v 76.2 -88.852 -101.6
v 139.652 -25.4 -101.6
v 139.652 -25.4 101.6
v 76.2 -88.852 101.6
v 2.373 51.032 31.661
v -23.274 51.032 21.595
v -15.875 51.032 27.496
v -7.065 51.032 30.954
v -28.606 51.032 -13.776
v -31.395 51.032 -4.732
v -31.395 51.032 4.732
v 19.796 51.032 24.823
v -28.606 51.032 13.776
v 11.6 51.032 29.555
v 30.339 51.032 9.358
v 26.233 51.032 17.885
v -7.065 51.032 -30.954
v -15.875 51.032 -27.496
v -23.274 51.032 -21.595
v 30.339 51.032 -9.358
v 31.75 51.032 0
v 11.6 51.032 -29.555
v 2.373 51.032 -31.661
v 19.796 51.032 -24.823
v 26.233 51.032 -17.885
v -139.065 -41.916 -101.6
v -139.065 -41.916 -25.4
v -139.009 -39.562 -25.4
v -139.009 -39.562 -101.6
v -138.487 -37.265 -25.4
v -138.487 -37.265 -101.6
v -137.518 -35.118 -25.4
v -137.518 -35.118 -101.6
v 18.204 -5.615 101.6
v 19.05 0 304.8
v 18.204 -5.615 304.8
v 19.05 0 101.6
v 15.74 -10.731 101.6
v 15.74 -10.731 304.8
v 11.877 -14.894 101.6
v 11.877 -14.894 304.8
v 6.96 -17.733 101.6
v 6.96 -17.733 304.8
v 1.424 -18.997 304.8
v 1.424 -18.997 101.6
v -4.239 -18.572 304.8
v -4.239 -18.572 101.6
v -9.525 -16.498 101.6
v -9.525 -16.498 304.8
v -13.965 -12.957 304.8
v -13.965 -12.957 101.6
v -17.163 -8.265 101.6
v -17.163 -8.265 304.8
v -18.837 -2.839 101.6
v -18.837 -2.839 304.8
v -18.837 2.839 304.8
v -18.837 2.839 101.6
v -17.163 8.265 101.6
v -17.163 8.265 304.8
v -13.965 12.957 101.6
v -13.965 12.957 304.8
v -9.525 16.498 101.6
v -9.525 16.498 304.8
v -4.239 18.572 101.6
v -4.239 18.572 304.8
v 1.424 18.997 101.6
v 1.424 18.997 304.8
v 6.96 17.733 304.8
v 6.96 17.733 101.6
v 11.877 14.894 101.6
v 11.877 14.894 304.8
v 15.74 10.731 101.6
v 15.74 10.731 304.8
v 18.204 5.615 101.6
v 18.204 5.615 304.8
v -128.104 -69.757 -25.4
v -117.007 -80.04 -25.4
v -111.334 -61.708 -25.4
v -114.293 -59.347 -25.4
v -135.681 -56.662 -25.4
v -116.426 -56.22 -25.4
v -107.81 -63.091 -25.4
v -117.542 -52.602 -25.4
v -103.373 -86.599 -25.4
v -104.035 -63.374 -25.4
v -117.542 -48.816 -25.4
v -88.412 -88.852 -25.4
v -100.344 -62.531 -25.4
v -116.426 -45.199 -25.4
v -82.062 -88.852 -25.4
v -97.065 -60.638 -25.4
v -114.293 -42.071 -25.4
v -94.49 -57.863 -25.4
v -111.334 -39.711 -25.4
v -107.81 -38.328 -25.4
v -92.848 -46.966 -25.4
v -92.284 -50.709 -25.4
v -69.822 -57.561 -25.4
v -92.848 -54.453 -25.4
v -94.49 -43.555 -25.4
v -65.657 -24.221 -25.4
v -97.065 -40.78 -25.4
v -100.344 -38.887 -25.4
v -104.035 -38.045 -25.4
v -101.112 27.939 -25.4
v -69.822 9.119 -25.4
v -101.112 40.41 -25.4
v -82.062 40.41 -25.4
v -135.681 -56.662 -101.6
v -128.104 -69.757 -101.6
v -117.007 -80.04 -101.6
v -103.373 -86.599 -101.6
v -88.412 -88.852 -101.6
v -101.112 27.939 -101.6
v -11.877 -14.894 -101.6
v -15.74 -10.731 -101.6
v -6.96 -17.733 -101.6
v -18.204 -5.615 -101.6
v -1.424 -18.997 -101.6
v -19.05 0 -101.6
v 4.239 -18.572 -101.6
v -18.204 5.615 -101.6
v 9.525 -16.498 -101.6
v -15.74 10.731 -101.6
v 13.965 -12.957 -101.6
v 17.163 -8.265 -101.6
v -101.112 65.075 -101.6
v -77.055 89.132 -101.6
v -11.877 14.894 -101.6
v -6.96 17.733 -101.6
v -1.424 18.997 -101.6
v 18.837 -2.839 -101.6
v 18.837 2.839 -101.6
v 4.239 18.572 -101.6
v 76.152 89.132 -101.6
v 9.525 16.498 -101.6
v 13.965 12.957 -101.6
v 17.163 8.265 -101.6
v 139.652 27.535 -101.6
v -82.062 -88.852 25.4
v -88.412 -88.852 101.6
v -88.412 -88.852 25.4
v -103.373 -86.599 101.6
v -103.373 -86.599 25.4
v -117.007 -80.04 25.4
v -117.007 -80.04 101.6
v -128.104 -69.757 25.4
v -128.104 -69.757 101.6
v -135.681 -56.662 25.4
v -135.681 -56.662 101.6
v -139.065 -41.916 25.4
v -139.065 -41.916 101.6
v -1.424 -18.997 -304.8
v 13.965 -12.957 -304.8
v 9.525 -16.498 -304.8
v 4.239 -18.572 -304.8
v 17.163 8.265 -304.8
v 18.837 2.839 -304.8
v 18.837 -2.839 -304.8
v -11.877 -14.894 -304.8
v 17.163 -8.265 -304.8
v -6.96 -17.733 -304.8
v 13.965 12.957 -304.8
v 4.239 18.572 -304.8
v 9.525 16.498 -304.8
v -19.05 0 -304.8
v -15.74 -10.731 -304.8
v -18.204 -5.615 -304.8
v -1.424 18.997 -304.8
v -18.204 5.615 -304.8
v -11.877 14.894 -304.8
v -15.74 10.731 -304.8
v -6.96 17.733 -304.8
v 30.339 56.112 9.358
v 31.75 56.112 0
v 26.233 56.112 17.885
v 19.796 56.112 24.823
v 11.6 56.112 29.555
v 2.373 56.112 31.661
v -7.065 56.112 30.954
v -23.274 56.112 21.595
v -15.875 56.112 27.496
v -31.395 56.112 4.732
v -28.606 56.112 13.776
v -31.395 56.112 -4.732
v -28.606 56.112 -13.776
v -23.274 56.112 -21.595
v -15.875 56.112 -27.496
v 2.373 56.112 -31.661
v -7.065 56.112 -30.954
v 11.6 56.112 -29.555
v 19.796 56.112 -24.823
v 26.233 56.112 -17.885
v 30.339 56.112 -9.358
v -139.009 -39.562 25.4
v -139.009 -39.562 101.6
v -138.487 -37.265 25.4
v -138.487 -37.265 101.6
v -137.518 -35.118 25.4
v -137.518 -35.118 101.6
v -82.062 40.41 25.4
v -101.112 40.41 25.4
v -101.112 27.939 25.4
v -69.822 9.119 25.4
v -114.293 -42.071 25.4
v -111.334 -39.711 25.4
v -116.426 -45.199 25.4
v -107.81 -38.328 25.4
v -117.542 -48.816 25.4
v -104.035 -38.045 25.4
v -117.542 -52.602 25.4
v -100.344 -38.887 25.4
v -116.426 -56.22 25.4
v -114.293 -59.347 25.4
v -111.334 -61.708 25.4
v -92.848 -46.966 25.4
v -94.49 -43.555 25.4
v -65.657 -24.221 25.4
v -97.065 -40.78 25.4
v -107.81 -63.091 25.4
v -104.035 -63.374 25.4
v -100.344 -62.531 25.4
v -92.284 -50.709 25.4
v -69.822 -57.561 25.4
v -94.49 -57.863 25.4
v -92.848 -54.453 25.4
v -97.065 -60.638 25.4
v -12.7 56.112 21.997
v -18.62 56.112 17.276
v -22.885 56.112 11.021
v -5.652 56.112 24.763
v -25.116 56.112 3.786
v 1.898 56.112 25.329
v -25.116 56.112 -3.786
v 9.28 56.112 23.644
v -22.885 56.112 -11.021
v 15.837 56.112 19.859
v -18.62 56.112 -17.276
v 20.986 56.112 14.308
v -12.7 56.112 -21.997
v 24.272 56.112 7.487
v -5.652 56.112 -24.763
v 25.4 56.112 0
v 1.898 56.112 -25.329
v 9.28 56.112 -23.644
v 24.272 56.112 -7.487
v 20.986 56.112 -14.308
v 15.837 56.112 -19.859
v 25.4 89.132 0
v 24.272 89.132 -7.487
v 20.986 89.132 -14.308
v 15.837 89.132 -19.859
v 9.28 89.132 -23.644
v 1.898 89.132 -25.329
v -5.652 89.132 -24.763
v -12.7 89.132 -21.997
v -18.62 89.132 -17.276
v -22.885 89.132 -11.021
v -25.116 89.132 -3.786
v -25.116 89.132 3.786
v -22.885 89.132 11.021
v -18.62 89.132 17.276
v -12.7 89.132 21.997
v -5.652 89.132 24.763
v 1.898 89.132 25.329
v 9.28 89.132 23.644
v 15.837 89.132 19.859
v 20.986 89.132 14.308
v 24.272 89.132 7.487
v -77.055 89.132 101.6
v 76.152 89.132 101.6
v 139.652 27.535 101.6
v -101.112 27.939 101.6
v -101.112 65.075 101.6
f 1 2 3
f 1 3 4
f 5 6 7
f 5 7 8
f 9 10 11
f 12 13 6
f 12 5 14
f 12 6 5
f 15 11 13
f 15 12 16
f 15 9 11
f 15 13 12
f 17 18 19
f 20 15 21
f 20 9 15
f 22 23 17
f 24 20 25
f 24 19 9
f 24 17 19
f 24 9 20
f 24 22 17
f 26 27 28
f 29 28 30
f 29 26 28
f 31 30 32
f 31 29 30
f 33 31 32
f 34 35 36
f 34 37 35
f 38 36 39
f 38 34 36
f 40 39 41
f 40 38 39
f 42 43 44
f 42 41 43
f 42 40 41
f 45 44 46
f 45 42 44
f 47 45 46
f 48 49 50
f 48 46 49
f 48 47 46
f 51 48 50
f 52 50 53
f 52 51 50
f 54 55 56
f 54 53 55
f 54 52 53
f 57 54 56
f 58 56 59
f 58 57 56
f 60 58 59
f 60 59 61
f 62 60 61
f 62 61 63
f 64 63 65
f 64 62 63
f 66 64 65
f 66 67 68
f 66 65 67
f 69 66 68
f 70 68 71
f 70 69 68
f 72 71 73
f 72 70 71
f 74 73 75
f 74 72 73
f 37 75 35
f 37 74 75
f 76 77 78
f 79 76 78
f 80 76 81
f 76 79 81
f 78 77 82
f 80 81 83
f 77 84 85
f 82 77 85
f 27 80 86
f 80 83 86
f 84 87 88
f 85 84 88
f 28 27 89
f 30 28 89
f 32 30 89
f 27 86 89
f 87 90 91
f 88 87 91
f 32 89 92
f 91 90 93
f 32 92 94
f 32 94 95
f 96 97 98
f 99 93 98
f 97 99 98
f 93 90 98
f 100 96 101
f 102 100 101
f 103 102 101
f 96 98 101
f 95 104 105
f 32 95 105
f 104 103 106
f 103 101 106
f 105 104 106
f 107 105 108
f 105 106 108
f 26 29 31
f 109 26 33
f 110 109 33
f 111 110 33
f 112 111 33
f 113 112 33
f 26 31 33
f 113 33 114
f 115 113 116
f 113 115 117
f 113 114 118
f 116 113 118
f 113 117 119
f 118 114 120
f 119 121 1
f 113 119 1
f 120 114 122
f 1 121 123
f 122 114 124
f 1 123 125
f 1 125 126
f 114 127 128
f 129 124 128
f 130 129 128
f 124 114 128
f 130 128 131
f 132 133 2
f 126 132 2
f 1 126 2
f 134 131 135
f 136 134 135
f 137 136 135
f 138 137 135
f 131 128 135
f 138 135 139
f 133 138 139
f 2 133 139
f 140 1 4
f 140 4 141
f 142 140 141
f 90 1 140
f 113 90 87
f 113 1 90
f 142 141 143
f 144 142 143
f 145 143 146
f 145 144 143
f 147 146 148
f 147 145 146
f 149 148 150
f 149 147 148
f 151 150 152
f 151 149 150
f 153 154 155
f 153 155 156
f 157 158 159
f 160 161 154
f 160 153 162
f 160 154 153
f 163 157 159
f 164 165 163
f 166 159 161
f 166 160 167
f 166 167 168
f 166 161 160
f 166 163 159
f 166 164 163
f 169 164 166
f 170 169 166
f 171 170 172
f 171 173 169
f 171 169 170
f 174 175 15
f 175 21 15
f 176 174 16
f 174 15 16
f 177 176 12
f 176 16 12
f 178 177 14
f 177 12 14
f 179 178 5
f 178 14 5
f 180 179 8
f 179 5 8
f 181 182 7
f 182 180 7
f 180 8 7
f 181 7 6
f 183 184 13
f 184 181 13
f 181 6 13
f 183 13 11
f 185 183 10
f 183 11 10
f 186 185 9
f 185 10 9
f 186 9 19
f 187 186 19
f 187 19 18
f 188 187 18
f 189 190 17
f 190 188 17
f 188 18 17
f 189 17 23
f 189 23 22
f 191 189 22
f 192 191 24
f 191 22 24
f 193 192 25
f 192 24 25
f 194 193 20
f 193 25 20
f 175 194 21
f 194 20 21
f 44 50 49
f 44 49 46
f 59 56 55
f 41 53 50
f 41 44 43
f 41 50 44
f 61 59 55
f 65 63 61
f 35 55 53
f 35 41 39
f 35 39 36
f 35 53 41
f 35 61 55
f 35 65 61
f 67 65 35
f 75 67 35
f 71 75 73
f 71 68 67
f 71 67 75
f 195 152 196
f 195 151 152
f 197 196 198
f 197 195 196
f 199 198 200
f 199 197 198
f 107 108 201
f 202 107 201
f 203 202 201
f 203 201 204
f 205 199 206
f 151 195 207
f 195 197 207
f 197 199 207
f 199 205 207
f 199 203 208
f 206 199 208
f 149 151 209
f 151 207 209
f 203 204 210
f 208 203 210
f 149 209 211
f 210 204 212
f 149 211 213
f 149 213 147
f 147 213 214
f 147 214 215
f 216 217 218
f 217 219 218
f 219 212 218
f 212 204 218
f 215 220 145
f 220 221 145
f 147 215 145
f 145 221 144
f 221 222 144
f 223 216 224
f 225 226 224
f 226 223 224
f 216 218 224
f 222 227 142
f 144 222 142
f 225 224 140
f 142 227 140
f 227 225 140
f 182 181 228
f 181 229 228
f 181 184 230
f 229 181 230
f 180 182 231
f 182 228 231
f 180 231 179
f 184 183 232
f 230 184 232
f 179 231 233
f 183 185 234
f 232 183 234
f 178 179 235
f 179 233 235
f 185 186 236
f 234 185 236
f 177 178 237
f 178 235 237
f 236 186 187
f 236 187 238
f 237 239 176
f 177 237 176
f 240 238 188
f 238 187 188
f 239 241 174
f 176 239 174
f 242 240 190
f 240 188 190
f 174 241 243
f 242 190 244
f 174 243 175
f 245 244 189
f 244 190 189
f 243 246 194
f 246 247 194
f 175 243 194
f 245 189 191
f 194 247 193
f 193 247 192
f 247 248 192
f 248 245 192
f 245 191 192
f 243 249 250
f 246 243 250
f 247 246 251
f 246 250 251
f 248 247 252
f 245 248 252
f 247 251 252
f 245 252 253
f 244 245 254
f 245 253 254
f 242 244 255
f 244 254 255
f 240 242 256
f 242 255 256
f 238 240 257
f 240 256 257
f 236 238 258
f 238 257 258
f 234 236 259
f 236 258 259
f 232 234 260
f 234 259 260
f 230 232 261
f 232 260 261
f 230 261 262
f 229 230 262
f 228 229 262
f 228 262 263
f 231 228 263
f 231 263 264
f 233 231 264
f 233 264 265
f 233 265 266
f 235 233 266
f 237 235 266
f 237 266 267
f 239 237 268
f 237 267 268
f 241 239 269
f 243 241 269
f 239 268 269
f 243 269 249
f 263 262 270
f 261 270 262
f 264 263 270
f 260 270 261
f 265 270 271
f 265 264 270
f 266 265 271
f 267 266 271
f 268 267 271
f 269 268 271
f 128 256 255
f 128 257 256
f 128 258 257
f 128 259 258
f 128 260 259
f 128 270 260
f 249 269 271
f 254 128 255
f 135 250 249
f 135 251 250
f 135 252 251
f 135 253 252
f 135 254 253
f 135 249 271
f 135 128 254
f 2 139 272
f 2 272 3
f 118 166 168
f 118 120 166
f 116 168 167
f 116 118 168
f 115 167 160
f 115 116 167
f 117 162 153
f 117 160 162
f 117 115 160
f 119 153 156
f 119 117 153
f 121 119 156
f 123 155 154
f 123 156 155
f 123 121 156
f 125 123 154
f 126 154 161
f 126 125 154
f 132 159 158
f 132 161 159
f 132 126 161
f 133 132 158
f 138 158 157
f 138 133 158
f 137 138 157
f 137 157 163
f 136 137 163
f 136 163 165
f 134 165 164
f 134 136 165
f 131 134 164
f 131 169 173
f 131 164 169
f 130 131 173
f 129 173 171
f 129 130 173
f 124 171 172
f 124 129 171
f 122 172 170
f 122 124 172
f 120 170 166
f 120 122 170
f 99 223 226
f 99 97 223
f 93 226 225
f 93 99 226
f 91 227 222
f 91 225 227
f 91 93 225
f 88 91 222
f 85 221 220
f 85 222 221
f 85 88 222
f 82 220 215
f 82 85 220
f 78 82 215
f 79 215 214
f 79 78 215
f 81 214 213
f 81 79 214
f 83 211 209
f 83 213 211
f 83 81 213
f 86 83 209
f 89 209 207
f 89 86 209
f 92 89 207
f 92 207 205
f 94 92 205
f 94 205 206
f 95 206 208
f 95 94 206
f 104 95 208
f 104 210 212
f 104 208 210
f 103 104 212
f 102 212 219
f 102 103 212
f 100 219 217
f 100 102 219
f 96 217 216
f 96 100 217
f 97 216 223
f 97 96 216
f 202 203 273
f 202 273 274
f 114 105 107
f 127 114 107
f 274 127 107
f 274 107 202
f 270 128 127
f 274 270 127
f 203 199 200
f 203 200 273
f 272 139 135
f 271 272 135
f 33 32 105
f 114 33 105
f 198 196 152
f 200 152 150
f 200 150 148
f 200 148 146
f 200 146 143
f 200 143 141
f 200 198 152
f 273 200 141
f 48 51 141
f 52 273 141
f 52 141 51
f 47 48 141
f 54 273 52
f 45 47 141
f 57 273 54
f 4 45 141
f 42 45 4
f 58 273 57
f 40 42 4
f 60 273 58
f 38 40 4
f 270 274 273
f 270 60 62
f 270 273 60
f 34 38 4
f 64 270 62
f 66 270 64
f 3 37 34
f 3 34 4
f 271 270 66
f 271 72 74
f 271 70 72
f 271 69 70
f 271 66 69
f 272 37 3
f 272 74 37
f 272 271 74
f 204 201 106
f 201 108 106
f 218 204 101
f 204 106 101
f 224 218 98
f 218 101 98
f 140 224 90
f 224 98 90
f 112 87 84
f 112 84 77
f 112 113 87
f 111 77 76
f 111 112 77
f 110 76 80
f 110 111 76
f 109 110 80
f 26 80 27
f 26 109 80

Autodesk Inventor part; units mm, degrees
ref_plane "YZ Plane" through (0, 0, 0) normal (1, 0, 0) x (0, 1, 0)
ref_plane "XZ Plane" through (0, 0, 0) normal (0, 1, 0) x (-1, 0, 0)
ref_plane "XY Plane" through (0, 0, 0) normal (0, 0, 1) x (1, 0, 0)
sketch "Sketch1" plane through (0, 0, 0) normal (0, 0, 1) x (1, 0, 0)
  line L0 (-77.055, 89.1324) -> (76.1519, 89.1324)
  line L1 (139.6519, 27.5351) -> (139.6519, -25.4)
  line L2 (76.2, -88.852) -> (-88.4125, -88.852)
  line L3 (-139.7639, 88.9233) -> (139.6519, -88.852) construction
  line L4 (139.6519, 89.1324) -> (-139.2125, -88.852) construction
  line L5 (139.6519, 0.1402) -> (139.6519, 27.5351)
  line L6 (139.6519, 0.1402) -> (139.6519, -25.4)
  line L7 (139.6519, 0.1402) -> (139.6519, -25.4)
  line L8 (139.6519, -25.4) -> (76.2, -88.852)
  line L9 (139.6519, 27.5351) -> (76.1519, 89.1324)
  arc A0 (-139.0653, -41.9162) -> (-88.4125, -88.852) centre (-88.4125, -38.052) ccw
  line L10 (-137.5184, -35.1177) -> (-101.1125, 27.9391)
  line L11 (-139.2125, -38.052) -> (-66.4007, -38.052) construction
  line L12 (-101.1125, 27.9391) -> (-101.1125, 65.0749)
  arc A1 (-137.5184, -35.1177) -> (-139.0653, -41.9162) centre (-127.298, -41.0185) ccw
  line L13 (-77.055, 89.1324) -> (-101.1125, 65.0749)
  line L14 (-77.055, 89.1324) -> (-42.3901, 89.1324) construction
  point P0 (0, 0)
  dimension "d9" = 50.8
extrude "Extrusion1" add sketch "Sketch1" along normal mid plane 203.2
sketch "Sketch2" plane through (-77.055, 89.1324, 101.6) normal (0, 1, 0) x (1, 0, 0)
  circle A0 centre (77.055, 101.6) radius 25.4
  dimension "d16" = 50.8
extrude "Extrusion2" cut sketch "Sketch2" against normal blind 38.1
sketch "Sketch4" plane through (0, 0, 101.6) normal (0, 0, 1) x (1, 0, 0)
  circle A0 centre (0, 0) radius 19.05
  dimension "d22" = 38.1
sketch "Sketch5" plane through (0, 0, -101.6) normal (0, 0, -1) x (-1, 0, 0)
  circle A0 centre (0, 0) radius 19.05
  dimension "d23" = 38.1
extrude "Extrusion4" add sketch "Sketch5" along normal blind 203.2
extrude "Extrusion5" add sketch "Sketch4" along normal blind 203.2
sketch "Sketch6" plane through (-101.1125, 27.9391, 101.6) normal (-1, 0, 0) x (0, 0, 1)
  line L0 (-127, 12.4705) -> (-75.6804, 12.4705)
  line L1 (-127, 12.4705) -> (-76.2, 12.4705)
  line L2 (-76.2, 12.4705) -> (-76.2, -116.9301)
  line L3 (-76.2, -116.9301) -> (-127, -116.9301)
  line L4 (-127, -116.9301) -> (-127, 12.4705)
  point P0 (-101.6, -27.9391)
extrude "Extrusion6" cut sketch "Sketch6" along normal blind 38.1 and the other way blind 19.05
sketch "Sketch7" plane through (-101.1125, 27.9391, -25.4) normal (0, 0, 1) x (1, 0, 0)
  circle A0 centre (-3.8712, -78.6483) radius 12.7
  point P0 (101.1125, -27.9391)
  dimension "d34" = 25.4
extrude "Extrusion7" add sketch "Sketch7" along normal blind 50.8
sketch "Sketch8" plane through (-101.1125, 27.9391, -25.4) normal (0, 0, 1) x (1, 0, 0)
  line L0 (19.05, -116.7911) -> (19.05, 12.4705) projected
  arc A0 (19.05, -116.7911) -> (19.05, 12.4705) centre (-100.0567, -52.1603) ccw
  point P0 (101.1125, -27.9391)
extrude "Extrusion8" cut sketch "Sketch8" along normal blind 50.8
sketch "Sketch10" plane through (0, 51.0324, 0) normal (0, 1, 0) x (1, 0, 0)
  circle A0 centre (0, 0) radius 25.4 projected
  circle A1 centre (0, 0) radius 31.75
  dimension "d42" = 63.5
extrude "Extrusion10" cut sketch "Sketch10" along normal blind 5.08
properties part number "center piece"
